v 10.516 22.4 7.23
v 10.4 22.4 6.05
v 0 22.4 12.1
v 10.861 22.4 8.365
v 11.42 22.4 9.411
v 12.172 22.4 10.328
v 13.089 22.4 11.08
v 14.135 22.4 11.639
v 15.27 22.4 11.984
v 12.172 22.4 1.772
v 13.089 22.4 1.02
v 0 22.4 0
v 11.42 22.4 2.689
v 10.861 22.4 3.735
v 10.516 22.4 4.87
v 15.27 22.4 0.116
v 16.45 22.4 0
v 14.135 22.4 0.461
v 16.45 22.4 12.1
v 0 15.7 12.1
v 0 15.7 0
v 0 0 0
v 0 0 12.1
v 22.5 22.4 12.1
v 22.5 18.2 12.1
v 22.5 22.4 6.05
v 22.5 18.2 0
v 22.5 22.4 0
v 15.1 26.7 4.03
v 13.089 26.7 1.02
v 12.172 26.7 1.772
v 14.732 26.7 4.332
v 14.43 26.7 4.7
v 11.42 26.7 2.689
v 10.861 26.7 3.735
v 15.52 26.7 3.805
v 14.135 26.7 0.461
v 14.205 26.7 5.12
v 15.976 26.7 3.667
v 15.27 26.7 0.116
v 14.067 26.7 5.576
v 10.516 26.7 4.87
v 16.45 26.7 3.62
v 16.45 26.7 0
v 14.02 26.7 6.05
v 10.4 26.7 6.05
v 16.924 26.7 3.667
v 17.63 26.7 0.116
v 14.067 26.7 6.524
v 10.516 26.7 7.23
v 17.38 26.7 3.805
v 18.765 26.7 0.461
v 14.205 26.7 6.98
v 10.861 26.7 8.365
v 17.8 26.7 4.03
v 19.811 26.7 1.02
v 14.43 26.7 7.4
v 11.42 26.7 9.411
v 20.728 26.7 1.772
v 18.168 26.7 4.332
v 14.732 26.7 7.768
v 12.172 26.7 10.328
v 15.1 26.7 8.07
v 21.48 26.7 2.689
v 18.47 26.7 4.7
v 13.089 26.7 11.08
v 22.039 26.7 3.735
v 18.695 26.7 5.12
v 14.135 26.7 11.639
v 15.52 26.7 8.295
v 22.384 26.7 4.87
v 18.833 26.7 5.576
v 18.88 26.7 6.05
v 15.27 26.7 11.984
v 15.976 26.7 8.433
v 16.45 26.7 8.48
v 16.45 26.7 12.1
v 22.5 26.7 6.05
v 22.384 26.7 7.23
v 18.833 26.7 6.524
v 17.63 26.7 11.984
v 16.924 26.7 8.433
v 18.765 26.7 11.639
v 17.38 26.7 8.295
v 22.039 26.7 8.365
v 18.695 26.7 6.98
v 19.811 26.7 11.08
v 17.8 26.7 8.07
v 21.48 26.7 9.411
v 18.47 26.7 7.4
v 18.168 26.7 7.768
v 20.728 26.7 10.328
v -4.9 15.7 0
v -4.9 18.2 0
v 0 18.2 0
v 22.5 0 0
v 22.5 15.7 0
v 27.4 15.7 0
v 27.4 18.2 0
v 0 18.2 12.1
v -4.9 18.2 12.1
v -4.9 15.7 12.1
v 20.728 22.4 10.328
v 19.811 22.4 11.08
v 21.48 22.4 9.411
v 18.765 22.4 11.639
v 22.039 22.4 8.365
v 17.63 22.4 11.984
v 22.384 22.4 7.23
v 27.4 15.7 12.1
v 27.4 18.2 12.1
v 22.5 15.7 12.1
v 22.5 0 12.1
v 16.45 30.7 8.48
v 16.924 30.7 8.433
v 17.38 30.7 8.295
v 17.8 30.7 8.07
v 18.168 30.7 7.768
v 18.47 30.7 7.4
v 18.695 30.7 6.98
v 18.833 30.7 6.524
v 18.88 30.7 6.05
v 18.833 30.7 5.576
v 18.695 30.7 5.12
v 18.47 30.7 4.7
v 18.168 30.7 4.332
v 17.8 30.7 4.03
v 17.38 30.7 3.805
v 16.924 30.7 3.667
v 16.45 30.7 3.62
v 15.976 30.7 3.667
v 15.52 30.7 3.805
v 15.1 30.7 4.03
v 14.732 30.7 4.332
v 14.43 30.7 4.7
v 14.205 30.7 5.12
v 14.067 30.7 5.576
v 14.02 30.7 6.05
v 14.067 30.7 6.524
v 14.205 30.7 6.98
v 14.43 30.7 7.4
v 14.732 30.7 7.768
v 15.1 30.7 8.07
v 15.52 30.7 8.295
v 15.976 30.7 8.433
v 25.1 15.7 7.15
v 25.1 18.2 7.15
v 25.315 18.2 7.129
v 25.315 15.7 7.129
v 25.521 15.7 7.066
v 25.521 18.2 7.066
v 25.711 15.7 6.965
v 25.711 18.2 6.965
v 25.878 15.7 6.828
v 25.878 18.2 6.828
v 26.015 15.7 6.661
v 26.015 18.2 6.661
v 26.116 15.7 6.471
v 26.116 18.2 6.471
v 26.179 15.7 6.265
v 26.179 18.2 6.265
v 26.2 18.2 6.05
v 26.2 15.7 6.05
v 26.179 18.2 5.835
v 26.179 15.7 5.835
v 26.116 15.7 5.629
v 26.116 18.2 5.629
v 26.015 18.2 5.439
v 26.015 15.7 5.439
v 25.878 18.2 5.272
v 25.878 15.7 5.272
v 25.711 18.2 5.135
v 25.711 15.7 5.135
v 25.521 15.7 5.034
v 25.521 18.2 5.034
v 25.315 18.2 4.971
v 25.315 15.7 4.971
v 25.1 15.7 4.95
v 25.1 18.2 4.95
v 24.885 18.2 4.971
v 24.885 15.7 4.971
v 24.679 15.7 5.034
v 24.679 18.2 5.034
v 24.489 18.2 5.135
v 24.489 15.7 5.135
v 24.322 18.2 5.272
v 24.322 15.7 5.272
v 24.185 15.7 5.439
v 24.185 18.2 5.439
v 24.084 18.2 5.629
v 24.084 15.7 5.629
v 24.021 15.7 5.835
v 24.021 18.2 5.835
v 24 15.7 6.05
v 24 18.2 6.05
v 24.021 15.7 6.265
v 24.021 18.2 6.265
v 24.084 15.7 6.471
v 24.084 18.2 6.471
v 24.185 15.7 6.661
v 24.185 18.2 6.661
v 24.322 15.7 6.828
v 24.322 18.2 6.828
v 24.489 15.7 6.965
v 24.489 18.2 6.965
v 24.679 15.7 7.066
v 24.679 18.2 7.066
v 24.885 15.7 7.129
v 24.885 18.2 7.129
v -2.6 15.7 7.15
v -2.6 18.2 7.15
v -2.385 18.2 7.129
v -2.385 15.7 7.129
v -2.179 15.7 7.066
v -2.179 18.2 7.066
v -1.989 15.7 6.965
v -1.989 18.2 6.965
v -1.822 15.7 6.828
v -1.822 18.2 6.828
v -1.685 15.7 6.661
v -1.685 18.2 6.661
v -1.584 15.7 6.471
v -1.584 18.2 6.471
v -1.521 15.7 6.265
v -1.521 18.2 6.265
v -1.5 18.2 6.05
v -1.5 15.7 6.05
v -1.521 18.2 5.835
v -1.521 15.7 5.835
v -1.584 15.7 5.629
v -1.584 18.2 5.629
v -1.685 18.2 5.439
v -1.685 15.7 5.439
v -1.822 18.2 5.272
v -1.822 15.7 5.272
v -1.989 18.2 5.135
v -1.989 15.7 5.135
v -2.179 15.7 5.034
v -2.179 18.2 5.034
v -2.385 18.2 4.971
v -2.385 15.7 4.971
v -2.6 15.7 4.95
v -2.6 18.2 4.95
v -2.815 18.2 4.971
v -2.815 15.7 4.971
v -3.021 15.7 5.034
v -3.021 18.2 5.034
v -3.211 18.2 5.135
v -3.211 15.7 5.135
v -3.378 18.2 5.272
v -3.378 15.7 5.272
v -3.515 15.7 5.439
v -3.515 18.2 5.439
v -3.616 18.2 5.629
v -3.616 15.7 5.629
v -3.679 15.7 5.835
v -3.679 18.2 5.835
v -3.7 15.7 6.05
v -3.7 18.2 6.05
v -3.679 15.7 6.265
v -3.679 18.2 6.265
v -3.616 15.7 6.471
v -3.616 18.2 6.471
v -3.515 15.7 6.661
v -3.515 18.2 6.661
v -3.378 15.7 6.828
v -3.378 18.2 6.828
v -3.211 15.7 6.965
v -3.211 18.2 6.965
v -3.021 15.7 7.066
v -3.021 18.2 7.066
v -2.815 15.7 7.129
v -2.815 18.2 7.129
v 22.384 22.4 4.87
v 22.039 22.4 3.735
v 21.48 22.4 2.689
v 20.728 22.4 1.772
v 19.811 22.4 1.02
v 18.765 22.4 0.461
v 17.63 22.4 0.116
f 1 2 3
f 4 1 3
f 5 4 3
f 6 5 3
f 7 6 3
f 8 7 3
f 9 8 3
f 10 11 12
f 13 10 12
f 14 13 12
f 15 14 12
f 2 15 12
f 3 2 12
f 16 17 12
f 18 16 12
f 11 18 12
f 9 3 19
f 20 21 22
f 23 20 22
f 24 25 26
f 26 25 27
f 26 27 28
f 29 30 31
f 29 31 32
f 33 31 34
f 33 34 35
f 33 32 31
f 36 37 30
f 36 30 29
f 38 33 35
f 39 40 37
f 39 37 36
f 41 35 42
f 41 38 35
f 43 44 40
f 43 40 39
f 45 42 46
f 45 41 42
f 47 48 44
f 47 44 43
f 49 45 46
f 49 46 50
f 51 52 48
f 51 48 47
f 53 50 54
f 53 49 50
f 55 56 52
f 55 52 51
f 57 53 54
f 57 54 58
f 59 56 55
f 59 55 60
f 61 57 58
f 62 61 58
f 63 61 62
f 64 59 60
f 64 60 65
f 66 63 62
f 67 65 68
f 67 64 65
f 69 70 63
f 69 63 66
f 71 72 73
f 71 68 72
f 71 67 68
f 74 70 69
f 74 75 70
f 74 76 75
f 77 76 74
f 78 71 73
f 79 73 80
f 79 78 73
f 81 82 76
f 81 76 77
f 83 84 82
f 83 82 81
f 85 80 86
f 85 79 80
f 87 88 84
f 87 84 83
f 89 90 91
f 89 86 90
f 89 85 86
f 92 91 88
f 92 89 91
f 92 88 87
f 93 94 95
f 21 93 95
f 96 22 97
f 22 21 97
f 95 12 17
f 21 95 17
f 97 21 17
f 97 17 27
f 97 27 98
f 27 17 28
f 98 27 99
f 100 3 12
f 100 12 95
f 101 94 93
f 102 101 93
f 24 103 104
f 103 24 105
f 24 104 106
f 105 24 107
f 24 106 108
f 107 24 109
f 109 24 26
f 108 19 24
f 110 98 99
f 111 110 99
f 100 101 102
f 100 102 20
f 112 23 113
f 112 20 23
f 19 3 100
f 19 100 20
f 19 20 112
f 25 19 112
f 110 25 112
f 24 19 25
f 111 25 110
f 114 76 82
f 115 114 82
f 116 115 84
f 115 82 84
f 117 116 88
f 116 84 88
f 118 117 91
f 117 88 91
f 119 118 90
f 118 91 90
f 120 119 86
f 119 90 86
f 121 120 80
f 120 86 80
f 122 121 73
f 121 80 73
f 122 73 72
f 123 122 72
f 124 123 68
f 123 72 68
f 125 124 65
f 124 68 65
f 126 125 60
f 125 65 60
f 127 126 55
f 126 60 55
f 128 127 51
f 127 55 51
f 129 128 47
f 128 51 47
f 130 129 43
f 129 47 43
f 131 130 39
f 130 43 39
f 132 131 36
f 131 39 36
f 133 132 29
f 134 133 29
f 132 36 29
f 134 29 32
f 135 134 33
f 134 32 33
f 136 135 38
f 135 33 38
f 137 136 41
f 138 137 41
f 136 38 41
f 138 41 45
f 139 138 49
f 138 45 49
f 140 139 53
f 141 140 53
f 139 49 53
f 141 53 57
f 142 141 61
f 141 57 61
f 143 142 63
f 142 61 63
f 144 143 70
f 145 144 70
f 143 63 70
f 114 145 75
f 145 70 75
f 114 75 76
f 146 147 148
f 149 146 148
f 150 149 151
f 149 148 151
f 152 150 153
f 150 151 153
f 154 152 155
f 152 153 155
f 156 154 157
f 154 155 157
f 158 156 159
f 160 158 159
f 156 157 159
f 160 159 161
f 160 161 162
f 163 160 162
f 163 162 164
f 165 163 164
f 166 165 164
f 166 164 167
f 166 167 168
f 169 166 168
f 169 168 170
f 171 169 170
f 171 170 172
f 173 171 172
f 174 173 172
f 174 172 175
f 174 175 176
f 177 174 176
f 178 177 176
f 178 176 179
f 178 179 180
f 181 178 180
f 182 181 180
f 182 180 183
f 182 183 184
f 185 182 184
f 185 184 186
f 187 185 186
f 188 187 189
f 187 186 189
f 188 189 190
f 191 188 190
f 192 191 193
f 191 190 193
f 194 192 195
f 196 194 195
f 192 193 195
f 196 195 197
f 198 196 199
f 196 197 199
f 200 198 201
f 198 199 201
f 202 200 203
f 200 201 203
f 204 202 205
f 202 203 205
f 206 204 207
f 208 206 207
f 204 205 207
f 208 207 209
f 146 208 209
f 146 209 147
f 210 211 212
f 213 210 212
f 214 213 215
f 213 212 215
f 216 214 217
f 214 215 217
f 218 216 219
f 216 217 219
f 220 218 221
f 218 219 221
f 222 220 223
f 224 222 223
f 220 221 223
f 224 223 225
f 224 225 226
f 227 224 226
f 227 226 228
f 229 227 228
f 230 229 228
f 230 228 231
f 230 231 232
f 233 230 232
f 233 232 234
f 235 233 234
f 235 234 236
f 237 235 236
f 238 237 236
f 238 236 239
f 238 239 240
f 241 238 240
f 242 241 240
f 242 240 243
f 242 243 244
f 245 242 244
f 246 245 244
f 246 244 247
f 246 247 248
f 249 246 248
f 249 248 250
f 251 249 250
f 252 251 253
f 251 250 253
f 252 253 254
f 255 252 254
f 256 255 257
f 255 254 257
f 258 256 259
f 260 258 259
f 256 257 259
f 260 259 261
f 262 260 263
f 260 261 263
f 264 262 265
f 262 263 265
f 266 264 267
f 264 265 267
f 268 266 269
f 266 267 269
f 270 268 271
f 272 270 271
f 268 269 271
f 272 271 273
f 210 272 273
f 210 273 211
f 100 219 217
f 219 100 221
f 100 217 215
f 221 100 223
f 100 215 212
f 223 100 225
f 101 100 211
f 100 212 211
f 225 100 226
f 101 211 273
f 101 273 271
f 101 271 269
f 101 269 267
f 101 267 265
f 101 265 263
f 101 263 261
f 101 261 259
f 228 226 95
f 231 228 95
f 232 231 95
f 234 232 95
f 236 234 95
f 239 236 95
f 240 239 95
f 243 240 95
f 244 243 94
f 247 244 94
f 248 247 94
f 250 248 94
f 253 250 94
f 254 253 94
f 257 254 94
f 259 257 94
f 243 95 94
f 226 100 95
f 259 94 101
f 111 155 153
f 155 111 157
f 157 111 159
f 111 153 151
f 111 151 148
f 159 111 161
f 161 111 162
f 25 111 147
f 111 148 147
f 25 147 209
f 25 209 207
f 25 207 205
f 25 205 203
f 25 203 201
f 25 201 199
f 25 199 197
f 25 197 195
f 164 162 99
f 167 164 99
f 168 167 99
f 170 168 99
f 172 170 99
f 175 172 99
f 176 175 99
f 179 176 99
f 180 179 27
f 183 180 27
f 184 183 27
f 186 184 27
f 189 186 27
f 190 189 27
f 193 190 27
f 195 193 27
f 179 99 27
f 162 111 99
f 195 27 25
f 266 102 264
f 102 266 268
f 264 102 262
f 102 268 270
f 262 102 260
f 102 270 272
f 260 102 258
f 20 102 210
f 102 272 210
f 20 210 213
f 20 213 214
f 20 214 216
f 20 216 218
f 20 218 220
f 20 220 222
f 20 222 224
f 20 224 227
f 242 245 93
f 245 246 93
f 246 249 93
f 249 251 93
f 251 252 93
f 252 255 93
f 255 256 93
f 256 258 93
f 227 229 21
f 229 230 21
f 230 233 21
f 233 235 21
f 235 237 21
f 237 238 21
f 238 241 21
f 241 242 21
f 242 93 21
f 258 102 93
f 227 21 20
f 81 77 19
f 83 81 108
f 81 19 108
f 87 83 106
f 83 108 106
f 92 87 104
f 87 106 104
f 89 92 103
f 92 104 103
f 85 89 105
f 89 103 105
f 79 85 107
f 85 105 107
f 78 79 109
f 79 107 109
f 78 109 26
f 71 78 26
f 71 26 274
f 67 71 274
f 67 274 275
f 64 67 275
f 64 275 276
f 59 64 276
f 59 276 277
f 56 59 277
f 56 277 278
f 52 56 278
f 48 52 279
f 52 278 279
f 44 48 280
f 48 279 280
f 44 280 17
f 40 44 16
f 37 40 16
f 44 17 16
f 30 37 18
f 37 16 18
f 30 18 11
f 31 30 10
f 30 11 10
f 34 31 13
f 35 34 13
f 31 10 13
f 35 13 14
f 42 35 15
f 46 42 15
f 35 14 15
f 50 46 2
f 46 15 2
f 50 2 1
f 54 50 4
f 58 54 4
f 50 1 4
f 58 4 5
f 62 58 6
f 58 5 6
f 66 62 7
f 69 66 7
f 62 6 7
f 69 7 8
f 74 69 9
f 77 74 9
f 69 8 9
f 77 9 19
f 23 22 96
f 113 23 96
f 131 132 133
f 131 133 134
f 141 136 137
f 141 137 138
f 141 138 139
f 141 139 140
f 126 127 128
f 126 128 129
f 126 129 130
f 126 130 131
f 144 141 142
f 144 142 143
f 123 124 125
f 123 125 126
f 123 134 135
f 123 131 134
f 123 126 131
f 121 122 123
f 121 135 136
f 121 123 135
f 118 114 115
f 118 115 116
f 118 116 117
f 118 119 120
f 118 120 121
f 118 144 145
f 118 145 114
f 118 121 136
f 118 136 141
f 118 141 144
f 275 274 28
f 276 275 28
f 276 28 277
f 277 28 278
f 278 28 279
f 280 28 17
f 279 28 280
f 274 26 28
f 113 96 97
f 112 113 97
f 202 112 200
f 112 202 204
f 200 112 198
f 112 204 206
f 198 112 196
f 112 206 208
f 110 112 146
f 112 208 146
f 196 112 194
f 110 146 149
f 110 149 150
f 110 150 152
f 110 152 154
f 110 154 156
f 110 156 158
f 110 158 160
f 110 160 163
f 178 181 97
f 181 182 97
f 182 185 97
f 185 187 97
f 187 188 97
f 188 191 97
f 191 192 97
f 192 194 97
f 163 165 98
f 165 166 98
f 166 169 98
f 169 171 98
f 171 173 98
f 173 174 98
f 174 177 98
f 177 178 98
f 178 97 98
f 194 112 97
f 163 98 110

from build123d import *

# Parameters (mm, degrees)
EXTRUDE_1_DEPTH     = 12.1
SKETCH_3_R          = 6.05
EXTRUDE_2_DEPTH     = 4.3
SKETCH_4_R          = 2.43
EXTRUDE_3_DEPTH     = 4
SKETCH_5_R          = 1.1
CUT_EXTRUDE_1_DEPTH = 4


with BuildPart() as part:
    # Эскиз1 → Бобышка-Вытянуть1 (new body)
    with BuildSketch(Plane.XY):
        Polygon((0, 0), (22.5, 0), (22.5, 15.7), (27.4, 15.7), (27.4, 18.2), (22.5, 18.2), (22.5, 22.4), (0, 22.4), (0, 18.2), (-4.9, 18.2), (-4.9, 15.7), (0, 15.7), align=None)
    extrude(amount=EXTRUDE_1_DEPTH)

    # Эскиз3 → Бобышка-Вытянуть2 (add)
    with BuildSketch(Plane(origin=(0, 22.4, 0), x_dir=(1, 0, 0), z_dir=(0, 1, 0))):
        with Locations(Location((16.45, -6.05, 0), (0, 0, 270))):
            Circle(SKETCH_3_R)
    extrude(amount=EXTRUDE_2_DEPTH)

    # Эскиз4 → Бобышка-Вытянуть3 (add)
    with BuildSketch(Plane(origin=(0, 26.7, 0), x_dir=(1, 0, 0), z_dir=(0, 1, 0))):
        with Locations(Location((16.45, -6.05, 0), (0, 0, 270))):
            Circle(SKETCH_4_R)
    extrude(amount=EXTRUDE_3_DEPTH)

    # Эскиз5 → Вырез-Вытянуть1 (cut)
    with BuildSketch(Plane(origin=(0, 18.2, 0), x_dir=(1, 0, 0), z_dir=(0, 1, 0))):
        with Locations(Location((25.1, -6.05, 0), (0, 0, 270))):
            Circle(SKETCH_5_R)
        with Locations(Location((-2.6, -6.05, 0), (0, 0, 270))):
            Circle(SKETCH_5_R)
    extrude(amount=-CUT_EXTRUDE_1_DEPTH, mode=Mode.SUBTRACT)


solid = part.part
